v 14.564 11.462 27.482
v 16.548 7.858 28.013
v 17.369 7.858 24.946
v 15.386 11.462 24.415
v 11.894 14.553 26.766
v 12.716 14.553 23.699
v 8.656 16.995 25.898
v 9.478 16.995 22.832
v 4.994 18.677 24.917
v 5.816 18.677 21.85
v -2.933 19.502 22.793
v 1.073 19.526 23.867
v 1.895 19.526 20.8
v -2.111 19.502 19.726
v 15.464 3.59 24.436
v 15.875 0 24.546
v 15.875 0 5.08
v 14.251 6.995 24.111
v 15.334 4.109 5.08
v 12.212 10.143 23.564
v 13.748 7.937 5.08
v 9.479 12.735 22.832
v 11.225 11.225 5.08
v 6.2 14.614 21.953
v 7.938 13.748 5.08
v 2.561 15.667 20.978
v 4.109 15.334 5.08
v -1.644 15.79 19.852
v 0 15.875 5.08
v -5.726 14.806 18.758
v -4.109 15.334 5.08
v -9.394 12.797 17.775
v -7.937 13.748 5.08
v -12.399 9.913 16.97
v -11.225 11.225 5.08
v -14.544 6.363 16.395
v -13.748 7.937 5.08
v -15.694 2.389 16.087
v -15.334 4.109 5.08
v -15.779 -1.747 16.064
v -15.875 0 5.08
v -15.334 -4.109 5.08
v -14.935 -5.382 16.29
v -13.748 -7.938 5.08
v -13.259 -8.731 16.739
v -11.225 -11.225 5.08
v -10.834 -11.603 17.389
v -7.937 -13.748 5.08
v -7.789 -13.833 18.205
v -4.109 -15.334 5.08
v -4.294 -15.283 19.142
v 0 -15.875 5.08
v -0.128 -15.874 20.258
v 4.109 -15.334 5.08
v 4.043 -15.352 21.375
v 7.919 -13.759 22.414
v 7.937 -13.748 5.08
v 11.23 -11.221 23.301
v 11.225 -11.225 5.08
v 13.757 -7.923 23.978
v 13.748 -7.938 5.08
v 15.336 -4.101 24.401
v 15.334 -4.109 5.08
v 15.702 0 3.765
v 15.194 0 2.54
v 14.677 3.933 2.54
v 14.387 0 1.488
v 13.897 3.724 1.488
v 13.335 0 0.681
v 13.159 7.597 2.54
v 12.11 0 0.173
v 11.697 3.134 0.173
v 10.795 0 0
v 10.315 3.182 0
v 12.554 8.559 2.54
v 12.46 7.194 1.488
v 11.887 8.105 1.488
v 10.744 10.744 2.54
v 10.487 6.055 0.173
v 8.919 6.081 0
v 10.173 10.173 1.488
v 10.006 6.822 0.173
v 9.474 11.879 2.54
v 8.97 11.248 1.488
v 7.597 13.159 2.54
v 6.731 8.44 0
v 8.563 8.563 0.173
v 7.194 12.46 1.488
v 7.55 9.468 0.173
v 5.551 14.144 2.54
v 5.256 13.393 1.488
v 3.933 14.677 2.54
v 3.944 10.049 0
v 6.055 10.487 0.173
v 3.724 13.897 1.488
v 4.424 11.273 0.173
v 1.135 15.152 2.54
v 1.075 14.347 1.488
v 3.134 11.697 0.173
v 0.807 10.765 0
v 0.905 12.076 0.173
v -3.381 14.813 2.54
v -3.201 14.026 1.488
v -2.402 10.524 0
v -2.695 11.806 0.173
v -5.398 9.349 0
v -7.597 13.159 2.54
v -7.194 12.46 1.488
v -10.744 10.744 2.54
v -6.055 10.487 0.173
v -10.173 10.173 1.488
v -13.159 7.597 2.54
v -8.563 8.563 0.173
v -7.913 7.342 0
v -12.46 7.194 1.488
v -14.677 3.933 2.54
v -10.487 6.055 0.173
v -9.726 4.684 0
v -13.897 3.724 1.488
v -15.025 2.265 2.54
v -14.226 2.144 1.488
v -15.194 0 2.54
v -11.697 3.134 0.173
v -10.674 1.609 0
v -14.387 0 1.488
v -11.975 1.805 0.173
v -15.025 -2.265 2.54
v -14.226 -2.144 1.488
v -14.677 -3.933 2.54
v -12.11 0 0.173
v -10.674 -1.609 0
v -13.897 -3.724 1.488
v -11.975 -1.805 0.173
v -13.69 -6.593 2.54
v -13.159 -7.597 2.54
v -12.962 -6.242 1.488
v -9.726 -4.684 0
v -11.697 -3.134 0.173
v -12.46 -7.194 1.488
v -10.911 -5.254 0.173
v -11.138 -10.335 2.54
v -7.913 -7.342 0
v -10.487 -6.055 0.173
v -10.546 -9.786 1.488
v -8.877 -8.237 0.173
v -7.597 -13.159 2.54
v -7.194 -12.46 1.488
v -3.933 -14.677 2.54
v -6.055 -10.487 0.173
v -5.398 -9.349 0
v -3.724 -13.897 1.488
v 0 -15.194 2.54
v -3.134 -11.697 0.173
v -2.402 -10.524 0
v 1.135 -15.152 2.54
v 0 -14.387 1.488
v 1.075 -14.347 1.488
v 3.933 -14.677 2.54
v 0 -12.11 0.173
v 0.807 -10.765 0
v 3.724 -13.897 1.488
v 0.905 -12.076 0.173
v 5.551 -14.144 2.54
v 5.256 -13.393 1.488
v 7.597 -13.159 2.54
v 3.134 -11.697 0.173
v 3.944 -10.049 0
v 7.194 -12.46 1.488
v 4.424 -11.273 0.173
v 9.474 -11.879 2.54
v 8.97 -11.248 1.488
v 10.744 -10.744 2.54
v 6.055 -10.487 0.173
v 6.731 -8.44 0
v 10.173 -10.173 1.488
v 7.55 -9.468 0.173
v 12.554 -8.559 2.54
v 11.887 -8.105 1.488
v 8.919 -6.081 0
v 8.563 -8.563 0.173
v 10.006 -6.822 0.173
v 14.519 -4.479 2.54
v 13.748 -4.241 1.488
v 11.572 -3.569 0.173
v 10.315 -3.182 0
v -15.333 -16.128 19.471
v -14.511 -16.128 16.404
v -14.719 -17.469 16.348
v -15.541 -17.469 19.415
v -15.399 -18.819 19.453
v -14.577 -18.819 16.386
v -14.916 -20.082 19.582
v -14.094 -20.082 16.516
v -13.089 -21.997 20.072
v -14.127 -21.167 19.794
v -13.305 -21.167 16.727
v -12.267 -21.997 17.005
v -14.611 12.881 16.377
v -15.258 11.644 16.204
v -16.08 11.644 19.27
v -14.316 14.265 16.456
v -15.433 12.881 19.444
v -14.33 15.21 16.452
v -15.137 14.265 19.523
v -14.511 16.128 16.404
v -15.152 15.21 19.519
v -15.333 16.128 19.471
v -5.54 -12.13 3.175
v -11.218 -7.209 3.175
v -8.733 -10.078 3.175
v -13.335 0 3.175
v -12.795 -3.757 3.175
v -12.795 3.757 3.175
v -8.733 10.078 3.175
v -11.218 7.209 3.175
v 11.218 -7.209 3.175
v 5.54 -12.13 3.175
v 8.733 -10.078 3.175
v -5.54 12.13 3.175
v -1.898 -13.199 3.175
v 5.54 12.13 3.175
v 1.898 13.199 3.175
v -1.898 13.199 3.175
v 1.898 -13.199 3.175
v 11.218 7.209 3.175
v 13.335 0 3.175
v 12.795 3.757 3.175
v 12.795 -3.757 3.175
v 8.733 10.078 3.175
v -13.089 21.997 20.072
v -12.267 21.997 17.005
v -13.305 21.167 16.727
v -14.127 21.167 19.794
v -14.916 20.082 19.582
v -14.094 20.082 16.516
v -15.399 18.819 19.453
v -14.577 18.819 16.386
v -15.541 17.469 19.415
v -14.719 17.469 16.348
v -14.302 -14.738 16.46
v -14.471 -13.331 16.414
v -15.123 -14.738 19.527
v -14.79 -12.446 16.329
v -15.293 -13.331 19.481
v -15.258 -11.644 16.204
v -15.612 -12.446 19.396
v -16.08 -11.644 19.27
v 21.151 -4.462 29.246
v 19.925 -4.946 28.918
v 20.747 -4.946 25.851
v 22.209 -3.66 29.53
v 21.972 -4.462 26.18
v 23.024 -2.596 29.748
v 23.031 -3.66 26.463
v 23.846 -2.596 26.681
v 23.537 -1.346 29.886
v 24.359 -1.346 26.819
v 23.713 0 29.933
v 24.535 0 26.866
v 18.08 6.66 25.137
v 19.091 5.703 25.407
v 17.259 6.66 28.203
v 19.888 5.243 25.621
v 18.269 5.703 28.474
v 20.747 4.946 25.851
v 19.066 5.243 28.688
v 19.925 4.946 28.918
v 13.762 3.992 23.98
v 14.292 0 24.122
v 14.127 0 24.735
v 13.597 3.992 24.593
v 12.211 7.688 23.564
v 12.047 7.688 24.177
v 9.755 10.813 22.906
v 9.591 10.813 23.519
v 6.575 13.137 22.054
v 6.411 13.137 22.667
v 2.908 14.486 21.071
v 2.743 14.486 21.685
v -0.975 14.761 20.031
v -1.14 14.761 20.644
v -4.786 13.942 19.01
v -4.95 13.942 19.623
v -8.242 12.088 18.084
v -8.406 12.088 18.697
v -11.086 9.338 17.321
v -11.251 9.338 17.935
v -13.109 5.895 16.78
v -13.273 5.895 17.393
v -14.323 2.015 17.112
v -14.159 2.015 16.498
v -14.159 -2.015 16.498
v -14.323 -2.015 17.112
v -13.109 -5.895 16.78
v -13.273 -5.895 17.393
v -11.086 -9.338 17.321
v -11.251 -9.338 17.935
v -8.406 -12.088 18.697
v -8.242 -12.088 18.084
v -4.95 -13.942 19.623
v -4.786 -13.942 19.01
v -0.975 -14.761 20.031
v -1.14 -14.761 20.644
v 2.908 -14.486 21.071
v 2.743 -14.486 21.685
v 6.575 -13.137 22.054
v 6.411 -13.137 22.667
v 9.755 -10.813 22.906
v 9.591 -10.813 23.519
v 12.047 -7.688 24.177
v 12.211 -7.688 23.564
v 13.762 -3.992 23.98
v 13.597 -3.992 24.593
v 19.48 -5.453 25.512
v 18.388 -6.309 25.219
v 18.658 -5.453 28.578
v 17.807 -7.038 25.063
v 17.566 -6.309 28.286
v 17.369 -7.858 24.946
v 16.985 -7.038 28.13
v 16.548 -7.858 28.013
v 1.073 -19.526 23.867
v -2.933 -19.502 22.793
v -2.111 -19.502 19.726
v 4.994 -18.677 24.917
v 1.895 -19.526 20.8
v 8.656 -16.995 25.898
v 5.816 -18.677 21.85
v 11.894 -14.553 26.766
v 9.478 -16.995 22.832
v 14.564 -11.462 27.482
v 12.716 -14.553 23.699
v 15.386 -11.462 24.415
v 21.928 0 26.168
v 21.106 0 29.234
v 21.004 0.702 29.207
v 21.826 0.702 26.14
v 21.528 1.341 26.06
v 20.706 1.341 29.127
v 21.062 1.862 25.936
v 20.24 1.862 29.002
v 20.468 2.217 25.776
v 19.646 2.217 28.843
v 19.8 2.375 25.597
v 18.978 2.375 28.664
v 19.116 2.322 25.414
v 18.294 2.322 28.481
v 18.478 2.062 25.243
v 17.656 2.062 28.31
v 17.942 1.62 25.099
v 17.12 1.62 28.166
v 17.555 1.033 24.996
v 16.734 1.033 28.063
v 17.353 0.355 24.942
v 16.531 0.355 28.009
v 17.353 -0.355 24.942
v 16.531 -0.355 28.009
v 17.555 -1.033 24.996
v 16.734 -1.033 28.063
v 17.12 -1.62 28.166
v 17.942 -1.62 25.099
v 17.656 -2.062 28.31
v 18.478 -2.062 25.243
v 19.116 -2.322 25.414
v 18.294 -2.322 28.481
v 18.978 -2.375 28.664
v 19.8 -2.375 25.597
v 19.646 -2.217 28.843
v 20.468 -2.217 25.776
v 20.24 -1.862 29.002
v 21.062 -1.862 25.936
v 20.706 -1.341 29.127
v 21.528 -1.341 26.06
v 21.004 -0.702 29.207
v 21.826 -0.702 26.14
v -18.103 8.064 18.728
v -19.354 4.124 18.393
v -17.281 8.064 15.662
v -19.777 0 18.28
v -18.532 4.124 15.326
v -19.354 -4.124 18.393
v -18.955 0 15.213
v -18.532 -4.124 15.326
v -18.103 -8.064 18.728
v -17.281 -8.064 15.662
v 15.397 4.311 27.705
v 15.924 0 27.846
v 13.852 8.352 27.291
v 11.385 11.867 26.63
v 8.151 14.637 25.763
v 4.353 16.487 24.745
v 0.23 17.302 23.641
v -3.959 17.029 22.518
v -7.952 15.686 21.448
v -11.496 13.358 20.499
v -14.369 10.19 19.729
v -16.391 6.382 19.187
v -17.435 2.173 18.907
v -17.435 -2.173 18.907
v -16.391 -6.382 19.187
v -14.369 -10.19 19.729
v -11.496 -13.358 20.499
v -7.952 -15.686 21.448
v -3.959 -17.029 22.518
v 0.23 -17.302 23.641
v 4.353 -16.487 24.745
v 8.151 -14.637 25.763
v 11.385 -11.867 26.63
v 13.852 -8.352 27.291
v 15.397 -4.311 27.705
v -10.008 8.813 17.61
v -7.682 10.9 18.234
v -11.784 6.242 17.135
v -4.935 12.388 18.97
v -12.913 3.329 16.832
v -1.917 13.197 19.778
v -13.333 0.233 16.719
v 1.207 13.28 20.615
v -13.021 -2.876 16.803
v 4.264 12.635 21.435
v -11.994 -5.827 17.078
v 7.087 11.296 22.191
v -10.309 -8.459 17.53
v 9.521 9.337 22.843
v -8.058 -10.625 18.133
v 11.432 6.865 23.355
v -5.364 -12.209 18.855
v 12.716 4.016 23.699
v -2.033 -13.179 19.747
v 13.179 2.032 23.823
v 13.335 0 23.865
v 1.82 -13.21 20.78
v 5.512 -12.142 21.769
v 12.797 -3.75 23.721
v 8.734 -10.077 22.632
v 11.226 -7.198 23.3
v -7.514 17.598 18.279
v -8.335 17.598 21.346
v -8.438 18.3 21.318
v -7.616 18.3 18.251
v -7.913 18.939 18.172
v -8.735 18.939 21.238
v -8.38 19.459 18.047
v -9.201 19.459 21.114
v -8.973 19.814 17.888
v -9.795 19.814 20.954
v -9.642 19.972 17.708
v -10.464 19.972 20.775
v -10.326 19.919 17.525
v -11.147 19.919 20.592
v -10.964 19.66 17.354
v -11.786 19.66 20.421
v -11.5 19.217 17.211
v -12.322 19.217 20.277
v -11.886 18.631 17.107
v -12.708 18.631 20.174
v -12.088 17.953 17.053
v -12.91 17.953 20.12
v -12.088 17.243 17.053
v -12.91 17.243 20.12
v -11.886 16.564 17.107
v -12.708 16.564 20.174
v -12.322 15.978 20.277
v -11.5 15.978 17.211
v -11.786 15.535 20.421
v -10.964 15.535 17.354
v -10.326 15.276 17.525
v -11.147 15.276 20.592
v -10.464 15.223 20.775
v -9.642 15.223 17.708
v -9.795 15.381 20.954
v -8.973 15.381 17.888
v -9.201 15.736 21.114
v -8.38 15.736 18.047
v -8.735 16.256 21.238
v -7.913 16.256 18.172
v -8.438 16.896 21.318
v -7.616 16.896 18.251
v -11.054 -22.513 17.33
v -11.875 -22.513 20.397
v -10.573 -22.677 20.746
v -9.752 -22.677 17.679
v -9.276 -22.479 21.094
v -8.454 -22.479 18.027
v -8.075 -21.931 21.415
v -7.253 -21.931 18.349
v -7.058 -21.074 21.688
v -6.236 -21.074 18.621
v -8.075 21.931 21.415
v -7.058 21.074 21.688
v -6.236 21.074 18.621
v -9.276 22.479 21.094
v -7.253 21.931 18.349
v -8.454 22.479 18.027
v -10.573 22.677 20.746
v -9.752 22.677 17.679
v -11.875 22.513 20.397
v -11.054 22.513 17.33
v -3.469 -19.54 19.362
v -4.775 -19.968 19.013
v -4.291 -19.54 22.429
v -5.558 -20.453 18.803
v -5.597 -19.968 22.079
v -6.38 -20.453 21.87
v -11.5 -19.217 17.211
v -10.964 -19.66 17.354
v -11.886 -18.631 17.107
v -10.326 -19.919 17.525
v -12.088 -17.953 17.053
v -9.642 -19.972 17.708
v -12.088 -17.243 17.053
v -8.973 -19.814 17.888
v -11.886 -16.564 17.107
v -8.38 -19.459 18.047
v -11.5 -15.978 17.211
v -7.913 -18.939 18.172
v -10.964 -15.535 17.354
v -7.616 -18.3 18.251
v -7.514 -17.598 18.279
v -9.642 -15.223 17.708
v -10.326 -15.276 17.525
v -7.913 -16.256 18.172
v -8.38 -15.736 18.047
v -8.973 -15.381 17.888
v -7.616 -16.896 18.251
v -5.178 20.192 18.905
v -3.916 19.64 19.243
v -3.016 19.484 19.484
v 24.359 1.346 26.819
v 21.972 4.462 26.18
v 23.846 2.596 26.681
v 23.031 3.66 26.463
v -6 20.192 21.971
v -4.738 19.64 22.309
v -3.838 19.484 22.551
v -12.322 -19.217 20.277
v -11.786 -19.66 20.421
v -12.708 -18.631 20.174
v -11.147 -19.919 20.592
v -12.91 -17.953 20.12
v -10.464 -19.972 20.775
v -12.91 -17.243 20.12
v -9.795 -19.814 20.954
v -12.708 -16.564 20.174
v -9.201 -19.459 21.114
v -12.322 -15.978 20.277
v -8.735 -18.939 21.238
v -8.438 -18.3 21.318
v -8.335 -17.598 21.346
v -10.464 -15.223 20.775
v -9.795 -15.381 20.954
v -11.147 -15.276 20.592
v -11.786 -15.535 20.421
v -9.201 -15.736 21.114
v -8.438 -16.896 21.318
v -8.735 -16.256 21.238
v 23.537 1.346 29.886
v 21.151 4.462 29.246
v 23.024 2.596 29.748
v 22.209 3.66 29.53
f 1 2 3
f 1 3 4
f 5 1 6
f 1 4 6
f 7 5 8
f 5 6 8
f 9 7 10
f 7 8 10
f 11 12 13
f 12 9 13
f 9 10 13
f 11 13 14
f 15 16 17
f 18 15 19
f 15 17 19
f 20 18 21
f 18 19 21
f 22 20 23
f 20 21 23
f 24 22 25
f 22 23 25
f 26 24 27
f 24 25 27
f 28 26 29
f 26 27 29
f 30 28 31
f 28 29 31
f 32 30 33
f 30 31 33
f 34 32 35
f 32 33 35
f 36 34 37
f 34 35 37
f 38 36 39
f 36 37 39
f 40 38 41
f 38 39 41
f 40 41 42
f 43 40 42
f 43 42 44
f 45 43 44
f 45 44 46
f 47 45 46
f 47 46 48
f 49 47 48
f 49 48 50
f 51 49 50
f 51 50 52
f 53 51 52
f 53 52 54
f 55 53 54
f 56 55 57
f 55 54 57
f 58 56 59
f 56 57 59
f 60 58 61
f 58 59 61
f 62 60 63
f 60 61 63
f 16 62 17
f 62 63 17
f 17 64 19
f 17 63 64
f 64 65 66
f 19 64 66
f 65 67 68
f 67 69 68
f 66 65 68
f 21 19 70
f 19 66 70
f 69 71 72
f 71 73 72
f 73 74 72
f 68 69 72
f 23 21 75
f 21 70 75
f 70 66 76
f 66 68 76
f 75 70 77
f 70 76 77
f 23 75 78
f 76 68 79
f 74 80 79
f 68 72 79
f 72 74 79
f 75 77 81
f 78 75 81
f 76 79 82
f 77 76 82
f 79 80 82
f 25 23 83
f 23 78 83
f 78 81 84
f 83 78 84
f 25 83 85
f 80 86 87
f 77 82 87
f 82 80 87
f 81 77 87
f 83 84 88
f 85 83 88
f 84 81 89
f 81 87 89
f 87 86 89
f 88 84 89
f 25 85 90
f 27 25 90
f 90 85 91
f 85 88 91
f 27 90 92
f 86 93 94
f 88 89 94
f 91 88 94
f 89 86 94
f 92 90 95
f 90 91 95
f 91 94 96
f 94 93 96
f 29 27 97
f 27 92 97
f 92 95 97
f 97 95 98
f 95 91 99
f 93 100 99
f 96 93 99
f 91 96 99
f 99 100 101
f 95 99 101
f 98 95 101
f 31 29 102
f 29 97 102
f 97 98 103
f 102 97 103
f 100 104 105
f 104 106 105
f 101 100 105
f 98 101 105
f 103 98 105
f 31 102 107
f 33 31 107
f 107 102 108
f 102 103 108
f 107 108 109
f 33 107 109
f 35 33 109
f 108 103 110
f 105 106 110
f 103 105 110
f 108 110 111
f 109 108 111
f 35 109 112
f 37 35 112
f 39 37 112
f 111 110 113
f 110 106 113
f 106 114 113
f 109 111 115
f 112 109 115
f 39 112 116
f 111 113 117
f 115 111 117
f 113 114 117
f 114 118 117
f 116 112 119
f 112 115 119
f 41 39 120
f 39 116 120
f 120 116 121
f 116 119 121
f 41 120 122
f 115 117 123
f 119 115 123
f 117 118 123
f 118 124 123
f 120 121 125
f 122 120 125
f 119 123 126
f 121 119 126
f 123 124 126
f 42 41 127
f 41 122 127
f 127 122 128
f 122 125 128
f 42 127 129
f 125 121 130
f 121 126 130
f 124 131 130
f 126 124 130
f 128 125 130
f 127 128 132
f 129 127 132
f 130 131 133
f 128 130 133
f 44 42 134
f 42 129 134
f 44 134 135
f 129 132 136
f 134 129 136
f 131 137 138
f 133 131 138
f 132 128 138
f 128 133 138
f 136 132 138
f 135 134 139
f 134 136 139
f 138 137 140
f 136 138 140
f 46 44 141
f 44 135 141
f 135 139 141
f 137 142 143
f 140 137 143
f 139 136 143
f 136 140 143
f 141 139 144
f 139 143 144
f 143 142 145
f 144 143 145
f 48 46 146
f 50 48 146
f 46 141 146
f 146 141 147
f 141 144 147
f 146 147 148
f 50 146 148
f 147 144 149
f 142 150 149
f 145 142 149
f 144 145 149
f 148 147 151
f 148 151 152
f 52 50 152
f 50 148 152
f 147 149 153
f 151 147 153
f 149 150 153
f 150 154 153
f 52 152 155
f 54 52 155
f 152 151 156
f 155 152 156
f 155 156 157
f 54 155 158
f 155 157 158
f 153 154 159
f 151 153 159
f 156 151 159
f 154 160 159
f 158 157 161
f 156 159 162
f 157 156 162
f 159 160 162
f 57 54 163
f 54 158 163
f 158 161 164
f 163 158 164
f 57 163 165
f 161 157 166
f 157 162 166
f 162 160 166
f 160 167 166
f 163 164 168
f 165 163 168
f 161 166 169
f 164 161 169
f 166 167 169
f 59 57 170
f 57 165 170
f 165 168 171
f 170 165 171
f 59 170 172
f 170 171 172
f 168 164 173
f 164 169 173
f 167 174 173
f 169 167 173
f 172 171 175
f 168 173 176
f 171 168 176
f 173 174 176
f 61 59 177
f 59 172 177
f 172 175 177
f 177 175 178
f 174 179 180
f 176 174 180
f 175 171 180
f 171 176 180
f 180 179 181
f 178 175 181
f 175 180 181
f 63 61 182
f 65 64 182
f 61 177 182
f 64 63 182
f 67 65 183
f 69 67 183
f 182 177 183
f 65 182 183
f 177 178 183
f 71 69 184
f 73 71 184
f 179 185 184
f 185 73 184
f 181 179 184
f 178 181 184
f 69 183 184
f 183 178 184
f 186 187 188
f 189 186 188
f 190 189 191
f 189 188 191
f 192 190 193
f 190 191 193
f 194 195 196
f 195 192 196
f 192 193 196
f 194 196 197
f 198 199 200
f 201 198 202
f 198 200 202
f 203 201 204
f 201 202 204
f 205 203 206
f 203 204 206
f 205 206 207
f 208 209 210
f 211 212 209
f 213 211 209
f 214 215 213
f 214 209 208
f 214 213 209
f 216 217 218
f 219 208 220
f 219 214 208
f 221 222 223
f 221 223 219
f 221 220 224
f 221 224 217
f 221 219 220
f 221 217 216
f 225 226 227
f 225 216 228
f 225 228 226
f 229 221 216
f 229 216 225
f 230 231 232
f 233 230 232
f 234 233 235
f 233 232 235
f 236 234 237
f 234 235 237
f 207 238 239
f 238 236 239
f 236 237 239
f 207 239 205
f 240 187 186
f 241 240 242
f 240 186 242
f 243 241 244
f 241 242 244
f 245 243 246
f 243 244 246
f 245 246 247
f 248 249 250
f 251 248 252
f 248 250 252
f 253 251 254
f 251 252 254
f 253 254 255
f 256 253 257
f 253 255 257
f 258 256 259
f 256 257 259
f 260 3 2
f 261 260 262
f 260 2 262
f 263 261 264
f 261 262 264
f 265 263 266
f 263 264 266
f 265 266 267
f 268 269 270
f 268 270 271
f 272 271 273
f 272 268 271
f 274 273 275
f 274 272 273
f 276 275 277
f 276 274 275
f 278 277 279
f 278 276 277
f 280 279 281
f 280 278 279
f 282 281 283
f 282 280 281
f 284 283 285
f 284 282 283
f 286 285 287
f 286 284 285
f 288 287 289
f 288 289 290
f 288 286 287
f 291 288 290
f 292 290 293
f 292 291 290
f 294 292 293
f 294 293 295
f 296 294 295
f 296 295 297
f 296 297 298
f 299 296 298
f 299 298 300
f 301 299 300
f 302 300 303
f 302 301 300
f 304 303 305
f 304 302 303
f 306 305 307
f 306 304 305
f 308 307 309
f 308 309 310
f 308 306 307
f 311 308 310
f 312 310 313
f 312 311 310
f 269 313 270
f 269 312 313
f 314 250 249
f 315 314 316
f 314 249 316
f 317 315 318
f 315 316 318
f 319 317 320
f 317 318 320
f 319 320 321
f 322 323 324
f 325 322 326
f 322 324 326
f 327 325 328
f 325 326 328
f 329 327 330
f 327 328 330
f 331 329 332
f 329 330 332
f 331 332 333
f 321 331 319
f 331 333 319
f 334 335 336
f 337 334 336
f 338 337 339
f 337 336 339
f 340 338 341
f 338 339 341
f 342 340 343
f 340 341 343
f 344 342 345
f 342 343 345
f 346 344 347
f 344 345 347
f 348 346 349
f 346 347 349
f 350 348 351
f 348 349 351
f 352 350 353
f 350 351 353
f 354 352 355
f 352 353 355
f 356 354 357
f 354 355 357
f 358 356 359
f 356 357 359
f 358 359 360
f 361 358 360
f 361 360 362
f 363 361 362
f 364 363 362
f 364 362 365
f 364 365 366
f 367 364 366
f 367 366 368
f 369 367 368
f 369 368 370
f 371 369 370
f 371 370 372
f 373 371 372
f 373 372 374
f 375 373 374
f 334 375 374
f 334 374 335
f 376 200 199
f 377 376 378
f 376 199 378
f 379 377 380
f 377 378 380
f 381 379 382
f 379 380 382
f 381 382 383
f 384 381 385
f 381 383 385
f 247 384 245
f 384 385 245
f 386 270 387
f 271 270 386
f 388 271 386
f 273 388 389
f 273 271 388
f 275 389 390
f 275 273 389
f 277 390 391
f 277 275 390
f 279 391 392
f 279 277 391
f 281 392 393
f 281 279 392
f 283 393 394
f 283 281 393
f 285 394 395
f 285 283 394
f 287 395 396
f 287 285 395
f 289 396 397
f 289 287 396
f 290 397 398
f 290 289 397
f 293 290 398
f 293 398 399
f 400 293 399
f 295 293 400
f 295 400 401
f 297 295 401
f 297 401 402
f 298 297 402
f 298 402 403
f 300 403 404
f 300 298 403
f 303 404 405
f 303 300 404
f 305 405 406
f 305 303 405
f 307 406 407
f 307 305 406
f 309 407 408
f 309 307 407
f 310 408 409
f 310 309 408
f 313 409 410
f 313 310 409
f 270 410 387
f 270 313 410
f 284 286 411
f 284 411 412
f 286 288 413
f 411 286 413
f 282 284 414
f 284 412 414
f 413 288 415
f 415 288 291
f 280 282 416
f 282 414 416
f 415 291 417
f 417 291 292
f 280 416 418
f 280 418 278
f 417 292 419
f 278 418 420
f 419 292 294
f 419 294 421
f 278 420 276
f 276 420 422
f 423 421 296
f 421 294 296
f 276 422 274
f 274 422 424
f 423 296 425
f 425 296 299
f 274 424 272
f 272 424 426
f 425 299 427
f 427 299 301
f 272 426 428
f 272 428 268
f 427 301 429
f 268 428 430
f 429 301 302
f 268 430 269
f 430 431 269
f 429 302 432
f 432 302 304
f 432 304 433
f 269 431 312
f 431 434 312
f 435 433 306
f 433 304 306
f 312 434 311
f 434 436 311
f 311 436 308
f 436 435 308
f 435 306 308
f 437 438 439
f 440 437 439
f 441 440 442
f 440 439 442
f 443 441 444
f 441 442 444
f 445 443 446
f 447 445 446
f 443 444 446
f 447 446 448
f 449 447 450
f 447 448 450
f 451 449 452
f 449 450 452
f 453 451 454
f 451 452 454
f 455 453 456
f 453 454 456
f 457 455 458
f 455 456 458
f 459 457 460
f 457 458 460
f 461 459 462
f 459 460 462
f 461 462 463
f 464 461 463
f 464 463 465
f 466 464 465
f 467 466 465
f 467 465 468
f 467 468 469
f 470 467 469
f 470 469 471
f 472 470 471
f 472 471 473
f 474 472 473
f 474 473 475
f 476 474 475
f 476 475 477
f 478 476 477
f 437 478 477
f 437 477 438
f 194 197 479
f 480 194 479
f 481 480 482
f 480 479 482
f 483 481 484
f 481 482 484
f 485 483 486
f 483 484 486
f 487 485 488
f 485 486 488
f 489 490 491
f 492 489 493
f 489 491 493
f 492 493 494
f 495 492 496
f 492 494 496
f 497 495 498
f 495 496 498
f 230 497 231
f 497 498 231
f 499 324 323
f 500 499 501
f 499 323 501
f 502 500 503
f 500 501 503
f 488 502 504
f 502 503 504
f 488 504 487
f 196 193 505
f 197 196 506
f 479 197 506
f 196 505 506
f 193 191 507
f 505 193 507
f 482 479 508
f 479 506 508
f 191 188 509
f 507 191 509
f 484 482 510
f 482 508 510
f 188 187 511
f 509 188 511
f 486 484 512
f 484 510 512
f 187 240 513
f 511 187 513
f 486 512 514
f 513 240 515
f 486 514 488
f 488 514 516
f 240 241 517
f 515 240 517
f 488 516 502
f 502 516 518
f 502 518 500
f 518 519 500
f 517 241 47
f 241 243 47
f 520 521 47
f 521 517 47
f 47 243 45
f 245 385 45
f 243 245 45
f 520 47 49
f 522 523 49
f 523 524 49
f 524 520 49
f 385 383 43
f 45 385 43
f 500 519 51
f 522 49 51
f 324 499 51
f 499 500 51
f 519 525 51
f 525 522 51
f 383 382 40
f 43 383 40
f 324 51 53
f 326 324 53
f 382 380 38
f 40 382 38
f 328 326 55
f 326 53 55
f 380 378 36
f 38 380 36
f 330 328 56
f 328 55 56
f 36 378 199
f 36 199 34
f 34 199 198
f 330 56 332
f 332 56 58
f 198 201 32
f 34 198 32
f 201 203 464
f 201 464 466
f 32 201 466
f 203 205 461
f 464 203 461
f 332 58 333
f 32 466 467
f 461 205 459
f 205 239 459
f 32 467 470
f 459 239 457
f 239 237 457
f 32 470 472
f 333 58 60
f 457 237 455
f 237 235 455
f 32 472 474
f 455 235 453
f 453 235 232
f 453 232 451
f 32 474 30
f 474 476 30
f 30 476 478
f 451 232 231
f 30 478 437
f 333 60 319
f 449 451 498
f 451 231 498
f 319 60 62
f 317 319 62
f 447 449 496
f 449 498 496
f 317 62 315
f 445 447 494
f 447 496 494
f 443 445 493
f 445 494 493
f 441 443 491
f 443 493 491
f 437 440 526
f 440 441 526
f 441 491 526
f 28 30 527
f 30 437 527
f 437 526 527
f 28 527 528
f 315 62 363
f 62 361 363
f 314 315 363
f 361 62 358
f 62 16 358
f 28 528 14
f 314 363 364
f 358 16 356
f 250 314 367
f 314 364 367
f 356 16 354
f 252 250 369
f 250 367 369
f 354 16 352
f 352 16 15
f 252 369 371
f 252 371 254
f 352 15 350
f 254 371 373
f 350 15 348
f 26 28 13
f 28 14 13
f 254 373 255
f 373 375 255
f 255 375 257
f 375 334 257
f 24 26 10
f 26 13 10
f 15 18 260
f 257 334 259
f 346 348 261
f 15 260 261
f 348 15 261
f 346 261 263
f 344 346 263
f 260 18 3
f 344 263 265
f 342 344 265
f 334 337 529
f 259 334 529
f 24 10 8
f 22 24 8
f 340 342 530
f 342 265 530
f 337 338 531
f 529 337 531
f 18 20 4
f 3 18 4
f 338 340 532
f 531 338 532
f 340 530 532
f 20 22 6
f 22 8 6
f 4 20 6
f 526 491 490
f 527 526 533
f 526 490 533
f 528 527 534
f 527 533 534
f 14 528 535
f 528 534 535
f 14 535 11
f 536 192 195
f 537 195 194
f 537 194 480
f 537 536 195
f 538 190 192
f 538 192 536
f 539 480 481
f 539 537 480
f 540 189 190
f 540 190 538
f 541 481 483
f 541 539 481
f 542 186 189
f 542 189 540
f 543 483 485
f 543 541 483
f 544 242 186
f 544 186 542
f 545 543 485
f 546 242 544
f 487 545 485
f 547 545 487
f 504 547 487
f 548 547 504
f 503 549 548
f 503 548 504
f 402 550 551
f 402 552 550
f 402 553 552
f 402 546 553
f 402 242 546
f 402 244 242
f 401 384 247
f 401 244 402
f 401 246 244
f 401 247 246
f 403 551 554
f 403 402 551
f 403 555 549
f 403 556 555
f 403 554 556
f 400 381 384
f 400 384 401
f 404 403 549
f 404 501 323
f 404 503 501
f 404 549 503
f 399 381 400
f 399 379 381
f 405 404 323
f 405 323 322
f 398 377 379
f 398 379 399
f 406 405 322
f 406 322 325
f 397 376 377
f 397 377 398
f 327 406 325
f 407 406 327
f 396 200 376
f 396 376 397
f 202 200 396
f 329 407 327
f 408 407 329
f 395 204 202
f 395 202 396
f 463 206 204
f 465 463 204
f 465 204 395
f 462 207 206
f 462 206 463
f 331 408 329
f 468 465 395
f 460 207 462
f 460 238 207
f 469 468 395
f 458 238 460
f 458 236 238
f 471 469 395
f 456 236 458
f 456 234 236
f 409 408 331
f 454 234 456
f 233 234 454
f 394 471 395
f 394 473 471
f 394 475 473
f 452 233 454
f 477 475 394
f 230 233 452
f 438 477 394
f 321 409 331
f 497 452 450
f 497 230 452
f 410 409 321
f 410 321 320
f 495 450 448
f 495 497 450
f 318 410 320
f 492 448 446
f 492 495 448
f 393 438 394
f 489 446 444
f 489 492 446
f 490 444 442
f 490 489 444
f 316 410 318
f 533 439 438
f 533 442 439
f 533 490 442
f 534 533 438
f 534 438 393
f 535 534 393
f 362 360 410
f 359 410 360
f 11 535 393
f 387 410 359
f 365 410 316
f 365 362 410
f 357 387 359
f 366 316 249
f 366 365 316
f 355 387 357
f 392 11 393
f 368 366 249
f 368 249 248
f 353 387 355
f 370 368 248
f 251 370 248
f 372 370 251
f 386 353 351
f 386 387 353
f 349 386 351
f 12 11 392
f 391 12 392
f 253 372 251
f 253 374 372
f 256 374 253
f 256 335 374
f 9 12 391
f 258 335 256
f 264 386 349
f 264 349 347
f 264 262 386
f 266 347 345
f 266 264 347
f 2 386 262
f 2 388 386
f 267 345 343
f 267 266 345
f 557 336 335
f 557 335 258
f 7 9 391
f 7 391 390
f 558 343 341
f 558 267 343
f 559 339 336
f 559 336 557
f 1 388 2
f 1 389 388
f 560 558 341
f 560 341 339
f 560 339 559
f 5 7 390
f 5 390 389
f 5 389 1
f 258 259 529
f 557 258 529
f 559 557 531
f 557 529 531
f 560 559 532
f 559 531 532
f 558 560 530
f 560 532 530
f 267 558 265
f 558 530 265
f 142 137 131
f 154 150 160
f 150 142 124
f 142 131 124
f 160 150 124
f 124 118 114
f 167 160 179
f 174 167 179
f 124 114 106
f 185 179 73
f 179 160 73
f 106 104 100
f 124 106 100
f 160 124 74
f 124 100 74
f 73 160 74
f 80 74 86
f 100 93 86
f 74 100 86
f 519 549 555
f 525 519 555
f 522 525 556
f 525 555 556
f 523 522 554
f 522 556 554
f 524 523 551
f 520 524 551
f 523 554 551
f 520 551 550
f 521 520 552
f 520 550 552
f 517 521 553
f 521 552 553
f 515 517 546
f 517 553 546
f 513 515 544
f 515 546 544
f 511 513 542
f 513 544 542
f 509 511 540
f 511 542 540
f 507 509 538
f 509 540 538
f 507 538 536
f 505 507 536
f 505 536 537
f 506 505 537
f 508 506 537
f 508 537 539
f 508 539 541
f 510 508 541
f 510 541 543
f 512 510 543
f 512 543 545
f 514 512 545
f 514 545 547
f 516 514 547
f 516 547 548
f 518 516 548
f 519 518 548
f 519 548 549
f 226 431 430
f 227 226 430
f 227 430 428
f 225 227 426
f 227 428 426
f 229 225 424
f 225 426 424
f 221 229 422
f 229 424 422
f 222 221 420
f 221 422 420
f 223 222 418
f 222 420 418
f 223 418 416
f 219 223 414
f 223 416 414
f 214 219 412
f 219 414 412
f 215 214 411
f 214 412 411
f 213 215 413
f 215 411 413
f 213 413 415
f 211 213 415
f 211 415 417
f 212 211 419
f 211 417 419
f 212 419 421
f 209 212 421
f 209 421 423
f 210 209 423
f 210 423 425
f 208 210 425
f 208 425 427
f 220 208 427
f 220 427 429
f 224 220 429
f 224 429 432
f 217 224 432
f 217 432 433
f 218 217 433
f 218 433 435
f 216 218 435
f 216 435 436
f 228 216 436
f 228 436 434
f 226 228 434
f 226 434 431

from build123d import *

# Parameters (mm, degrees)
F0_R      = 15.875
F1_DEPTH  = 25.4
F2_R      = 13.335
F3_DEPTH  = 22.225
F5_DEPTH  = 63.5
F6_R      = 25.4
F6_R_2    = 14.7959664705
F7_DEPTH  = 3.175
F8_R      = 2.38125
F9_DEPTH  = 25.4
F10_R     = 5.08
F12_DEPTH = 15.876
F13_SIZE  = 2.54
F14_R     = 5.08


with BuildPart() as f1:
    # F0 (on Top) → F1 (new body)
    with BuildSketch(Plane.XY):
        Circle(F0_R)
    extrude(amount=F1_DEPTH)

    # F2 (on face) → F3 (cut)
    with BuildSketch(Plane.XY.offset(25.4)):
        Circle(F2_R)
    extrude(amount=-F3_DEPTH, mode=Mode.SUBTRACT)

    # F4 (on Front) → F5 (cut, symmetric)
    with BuildSketch(Plane.XZ):
        Polygon((19.0631877631, 25.4), (-16.8183632195, 25.4), (-16.8183632195, 15.785567391), align=None)
    extrude(amount=F5_DEPTH, both=True, mode=Mode.SUBTRACT)

    # F6 (on face) → F7 (join)
    with BuildSketch(Plane(origin=(-5.0730085584, 0, 18.9327256873), x_dir=(0.9659258263, 0, 0.2588190451), z_dir=(-0.2588190451, 0, 0.9659258263))):
        with Locations((5.2519649236, 0)):
            Circle(F6_R)
        with Locations((5.2519649236, 0)):
            Circle(F6_R_2, mode=Mode.SUBTRACT)
    extrude(amount=F7_DEPTH)

    # F8 (on face) → F9 (cut)
    with BuildSketch(Plane(origin=(-5.8947590266, 0, 21.9995401858), x_dir=(0.9659258263, 0, 0.2588190451), z_dir=(-0.2588190451, 0, 0.9659258263))):
        with BuildLine():
            ThreePointArc((23.1907149236, 0), (25.5719649236, -2.38125), (27.9532149236, 0))
            ThreePointArc((27.9532149236, 0), (25.5719649236, 2.38125), (23.1907149236, 0))
        make_face()
        with Locations((-4.9080350764, 17.5976362049)):
            Circle(F8_R)
        with Locations((-4.9080350764, -17.5976362049)):
            Circle(F8_R)
    extrude(amount=-F9_DEPTH, mode=Mode.SUBTRACT)

    # F10
    f10_edges = [f1.edges().sort_by_distance(p)[0] for p in [
        (-15.875, 0, 0),
    ]]
    fillet(f10_edges, radius=F10_R)

    # F11 (on face) → F12 (cut, through all)
    with BuildSketch(Plane(origin=(-5.0730085584, 0, 18.9327256873), x_dir=(0.9659258263, 0, 0.2588190451), z_dir=(0.2588190451, 0, -0.9659258263))):
        with BuildLine():
            ThreePointArc((24.2529336259, -4.9057676704), (15.0639903014, -16.9949264796), (0, -18.908205428))
            ThreePointArc((0, -18.908205428), (-2.9619801154, -22.2901057135), (-7.4480353128, -21.9970451197))
            ThreePointArc((-7.4480353128, -21.9970451197), (17.9519648054, -21.9970453243), (30.6519649236, 0))
            ThreePointArc((30.6519649236, 0), (28.6627351357, -4.0315678707), (24.2529336259, -4.9057676704))
        make_face()
        with BuildLine():
            ThreePointArc((-7.4480353296, 21.99704511), (-20.1480350764, -9.7e-09), (-7.4480353128, -21.9970451197))
            ThreePointArc((-7.4480353128, -21.9970451197), (-9.9448603933, -18.2585376552), (-8.4970388552, -14.0024377576))
            ThreePointArc((-8.4970388552, -14.0024377576), (-14.3720858322, 0), (-8.4970388552, 14.0024377576))
            ThreePointArc((-8.4970388552, 14.0024377576), (-9.9448603946, 18.2585376456), (-7.4480353296, 21.99704511))
        make_face()
        with BuildLine():
            ThreePointArc((30.6519649236, 0), (17.951964797, 21.9970453292), (-7.4480353296, 21.99704511))
            ThreePointArc((-7.4480353296, 21.99704511), (-2.9619801244, 22.2901057172), (0, 18.908205428))
            ThreePointArc((0, 18.908205428), (15.0639903014, 16.9949264796), (24.2529336259, 4.9057676704))
            ThreePointArc((24.2529336259, 4.9057676704), (28.6627351357, 4.0315678707), (30.6519649236, 0))
        make_face()
    extrude(amount=-F12_DEPTH, mode=Mode.SUBTRACT)

    # F13
    f13_edges = [f1.edges().sort_by_distance(p)[0] for p in [
        (-15.113557, 0, 19.529371),
    ]]
    chamfer(f13_edges, length=F13_SIZE)

    # F14
    f14_edges = [f1.edges().sort_by_distance(p)[0] for p in [
        (-5.483884, -18.908205, 20.466133),
        (-13.691393, -14.002438, 18.266937),
        (-13.691393, 14.002438, 18.266937),
        (-5.483884, 18.908205, 20.466133),
        (17.942651, 4.905768, 26.743254),
        (17.942651, -4.905768, 26.743254),
    ]]
    fillet(f14_edges, radius=F14_R)


solid = f1.part
